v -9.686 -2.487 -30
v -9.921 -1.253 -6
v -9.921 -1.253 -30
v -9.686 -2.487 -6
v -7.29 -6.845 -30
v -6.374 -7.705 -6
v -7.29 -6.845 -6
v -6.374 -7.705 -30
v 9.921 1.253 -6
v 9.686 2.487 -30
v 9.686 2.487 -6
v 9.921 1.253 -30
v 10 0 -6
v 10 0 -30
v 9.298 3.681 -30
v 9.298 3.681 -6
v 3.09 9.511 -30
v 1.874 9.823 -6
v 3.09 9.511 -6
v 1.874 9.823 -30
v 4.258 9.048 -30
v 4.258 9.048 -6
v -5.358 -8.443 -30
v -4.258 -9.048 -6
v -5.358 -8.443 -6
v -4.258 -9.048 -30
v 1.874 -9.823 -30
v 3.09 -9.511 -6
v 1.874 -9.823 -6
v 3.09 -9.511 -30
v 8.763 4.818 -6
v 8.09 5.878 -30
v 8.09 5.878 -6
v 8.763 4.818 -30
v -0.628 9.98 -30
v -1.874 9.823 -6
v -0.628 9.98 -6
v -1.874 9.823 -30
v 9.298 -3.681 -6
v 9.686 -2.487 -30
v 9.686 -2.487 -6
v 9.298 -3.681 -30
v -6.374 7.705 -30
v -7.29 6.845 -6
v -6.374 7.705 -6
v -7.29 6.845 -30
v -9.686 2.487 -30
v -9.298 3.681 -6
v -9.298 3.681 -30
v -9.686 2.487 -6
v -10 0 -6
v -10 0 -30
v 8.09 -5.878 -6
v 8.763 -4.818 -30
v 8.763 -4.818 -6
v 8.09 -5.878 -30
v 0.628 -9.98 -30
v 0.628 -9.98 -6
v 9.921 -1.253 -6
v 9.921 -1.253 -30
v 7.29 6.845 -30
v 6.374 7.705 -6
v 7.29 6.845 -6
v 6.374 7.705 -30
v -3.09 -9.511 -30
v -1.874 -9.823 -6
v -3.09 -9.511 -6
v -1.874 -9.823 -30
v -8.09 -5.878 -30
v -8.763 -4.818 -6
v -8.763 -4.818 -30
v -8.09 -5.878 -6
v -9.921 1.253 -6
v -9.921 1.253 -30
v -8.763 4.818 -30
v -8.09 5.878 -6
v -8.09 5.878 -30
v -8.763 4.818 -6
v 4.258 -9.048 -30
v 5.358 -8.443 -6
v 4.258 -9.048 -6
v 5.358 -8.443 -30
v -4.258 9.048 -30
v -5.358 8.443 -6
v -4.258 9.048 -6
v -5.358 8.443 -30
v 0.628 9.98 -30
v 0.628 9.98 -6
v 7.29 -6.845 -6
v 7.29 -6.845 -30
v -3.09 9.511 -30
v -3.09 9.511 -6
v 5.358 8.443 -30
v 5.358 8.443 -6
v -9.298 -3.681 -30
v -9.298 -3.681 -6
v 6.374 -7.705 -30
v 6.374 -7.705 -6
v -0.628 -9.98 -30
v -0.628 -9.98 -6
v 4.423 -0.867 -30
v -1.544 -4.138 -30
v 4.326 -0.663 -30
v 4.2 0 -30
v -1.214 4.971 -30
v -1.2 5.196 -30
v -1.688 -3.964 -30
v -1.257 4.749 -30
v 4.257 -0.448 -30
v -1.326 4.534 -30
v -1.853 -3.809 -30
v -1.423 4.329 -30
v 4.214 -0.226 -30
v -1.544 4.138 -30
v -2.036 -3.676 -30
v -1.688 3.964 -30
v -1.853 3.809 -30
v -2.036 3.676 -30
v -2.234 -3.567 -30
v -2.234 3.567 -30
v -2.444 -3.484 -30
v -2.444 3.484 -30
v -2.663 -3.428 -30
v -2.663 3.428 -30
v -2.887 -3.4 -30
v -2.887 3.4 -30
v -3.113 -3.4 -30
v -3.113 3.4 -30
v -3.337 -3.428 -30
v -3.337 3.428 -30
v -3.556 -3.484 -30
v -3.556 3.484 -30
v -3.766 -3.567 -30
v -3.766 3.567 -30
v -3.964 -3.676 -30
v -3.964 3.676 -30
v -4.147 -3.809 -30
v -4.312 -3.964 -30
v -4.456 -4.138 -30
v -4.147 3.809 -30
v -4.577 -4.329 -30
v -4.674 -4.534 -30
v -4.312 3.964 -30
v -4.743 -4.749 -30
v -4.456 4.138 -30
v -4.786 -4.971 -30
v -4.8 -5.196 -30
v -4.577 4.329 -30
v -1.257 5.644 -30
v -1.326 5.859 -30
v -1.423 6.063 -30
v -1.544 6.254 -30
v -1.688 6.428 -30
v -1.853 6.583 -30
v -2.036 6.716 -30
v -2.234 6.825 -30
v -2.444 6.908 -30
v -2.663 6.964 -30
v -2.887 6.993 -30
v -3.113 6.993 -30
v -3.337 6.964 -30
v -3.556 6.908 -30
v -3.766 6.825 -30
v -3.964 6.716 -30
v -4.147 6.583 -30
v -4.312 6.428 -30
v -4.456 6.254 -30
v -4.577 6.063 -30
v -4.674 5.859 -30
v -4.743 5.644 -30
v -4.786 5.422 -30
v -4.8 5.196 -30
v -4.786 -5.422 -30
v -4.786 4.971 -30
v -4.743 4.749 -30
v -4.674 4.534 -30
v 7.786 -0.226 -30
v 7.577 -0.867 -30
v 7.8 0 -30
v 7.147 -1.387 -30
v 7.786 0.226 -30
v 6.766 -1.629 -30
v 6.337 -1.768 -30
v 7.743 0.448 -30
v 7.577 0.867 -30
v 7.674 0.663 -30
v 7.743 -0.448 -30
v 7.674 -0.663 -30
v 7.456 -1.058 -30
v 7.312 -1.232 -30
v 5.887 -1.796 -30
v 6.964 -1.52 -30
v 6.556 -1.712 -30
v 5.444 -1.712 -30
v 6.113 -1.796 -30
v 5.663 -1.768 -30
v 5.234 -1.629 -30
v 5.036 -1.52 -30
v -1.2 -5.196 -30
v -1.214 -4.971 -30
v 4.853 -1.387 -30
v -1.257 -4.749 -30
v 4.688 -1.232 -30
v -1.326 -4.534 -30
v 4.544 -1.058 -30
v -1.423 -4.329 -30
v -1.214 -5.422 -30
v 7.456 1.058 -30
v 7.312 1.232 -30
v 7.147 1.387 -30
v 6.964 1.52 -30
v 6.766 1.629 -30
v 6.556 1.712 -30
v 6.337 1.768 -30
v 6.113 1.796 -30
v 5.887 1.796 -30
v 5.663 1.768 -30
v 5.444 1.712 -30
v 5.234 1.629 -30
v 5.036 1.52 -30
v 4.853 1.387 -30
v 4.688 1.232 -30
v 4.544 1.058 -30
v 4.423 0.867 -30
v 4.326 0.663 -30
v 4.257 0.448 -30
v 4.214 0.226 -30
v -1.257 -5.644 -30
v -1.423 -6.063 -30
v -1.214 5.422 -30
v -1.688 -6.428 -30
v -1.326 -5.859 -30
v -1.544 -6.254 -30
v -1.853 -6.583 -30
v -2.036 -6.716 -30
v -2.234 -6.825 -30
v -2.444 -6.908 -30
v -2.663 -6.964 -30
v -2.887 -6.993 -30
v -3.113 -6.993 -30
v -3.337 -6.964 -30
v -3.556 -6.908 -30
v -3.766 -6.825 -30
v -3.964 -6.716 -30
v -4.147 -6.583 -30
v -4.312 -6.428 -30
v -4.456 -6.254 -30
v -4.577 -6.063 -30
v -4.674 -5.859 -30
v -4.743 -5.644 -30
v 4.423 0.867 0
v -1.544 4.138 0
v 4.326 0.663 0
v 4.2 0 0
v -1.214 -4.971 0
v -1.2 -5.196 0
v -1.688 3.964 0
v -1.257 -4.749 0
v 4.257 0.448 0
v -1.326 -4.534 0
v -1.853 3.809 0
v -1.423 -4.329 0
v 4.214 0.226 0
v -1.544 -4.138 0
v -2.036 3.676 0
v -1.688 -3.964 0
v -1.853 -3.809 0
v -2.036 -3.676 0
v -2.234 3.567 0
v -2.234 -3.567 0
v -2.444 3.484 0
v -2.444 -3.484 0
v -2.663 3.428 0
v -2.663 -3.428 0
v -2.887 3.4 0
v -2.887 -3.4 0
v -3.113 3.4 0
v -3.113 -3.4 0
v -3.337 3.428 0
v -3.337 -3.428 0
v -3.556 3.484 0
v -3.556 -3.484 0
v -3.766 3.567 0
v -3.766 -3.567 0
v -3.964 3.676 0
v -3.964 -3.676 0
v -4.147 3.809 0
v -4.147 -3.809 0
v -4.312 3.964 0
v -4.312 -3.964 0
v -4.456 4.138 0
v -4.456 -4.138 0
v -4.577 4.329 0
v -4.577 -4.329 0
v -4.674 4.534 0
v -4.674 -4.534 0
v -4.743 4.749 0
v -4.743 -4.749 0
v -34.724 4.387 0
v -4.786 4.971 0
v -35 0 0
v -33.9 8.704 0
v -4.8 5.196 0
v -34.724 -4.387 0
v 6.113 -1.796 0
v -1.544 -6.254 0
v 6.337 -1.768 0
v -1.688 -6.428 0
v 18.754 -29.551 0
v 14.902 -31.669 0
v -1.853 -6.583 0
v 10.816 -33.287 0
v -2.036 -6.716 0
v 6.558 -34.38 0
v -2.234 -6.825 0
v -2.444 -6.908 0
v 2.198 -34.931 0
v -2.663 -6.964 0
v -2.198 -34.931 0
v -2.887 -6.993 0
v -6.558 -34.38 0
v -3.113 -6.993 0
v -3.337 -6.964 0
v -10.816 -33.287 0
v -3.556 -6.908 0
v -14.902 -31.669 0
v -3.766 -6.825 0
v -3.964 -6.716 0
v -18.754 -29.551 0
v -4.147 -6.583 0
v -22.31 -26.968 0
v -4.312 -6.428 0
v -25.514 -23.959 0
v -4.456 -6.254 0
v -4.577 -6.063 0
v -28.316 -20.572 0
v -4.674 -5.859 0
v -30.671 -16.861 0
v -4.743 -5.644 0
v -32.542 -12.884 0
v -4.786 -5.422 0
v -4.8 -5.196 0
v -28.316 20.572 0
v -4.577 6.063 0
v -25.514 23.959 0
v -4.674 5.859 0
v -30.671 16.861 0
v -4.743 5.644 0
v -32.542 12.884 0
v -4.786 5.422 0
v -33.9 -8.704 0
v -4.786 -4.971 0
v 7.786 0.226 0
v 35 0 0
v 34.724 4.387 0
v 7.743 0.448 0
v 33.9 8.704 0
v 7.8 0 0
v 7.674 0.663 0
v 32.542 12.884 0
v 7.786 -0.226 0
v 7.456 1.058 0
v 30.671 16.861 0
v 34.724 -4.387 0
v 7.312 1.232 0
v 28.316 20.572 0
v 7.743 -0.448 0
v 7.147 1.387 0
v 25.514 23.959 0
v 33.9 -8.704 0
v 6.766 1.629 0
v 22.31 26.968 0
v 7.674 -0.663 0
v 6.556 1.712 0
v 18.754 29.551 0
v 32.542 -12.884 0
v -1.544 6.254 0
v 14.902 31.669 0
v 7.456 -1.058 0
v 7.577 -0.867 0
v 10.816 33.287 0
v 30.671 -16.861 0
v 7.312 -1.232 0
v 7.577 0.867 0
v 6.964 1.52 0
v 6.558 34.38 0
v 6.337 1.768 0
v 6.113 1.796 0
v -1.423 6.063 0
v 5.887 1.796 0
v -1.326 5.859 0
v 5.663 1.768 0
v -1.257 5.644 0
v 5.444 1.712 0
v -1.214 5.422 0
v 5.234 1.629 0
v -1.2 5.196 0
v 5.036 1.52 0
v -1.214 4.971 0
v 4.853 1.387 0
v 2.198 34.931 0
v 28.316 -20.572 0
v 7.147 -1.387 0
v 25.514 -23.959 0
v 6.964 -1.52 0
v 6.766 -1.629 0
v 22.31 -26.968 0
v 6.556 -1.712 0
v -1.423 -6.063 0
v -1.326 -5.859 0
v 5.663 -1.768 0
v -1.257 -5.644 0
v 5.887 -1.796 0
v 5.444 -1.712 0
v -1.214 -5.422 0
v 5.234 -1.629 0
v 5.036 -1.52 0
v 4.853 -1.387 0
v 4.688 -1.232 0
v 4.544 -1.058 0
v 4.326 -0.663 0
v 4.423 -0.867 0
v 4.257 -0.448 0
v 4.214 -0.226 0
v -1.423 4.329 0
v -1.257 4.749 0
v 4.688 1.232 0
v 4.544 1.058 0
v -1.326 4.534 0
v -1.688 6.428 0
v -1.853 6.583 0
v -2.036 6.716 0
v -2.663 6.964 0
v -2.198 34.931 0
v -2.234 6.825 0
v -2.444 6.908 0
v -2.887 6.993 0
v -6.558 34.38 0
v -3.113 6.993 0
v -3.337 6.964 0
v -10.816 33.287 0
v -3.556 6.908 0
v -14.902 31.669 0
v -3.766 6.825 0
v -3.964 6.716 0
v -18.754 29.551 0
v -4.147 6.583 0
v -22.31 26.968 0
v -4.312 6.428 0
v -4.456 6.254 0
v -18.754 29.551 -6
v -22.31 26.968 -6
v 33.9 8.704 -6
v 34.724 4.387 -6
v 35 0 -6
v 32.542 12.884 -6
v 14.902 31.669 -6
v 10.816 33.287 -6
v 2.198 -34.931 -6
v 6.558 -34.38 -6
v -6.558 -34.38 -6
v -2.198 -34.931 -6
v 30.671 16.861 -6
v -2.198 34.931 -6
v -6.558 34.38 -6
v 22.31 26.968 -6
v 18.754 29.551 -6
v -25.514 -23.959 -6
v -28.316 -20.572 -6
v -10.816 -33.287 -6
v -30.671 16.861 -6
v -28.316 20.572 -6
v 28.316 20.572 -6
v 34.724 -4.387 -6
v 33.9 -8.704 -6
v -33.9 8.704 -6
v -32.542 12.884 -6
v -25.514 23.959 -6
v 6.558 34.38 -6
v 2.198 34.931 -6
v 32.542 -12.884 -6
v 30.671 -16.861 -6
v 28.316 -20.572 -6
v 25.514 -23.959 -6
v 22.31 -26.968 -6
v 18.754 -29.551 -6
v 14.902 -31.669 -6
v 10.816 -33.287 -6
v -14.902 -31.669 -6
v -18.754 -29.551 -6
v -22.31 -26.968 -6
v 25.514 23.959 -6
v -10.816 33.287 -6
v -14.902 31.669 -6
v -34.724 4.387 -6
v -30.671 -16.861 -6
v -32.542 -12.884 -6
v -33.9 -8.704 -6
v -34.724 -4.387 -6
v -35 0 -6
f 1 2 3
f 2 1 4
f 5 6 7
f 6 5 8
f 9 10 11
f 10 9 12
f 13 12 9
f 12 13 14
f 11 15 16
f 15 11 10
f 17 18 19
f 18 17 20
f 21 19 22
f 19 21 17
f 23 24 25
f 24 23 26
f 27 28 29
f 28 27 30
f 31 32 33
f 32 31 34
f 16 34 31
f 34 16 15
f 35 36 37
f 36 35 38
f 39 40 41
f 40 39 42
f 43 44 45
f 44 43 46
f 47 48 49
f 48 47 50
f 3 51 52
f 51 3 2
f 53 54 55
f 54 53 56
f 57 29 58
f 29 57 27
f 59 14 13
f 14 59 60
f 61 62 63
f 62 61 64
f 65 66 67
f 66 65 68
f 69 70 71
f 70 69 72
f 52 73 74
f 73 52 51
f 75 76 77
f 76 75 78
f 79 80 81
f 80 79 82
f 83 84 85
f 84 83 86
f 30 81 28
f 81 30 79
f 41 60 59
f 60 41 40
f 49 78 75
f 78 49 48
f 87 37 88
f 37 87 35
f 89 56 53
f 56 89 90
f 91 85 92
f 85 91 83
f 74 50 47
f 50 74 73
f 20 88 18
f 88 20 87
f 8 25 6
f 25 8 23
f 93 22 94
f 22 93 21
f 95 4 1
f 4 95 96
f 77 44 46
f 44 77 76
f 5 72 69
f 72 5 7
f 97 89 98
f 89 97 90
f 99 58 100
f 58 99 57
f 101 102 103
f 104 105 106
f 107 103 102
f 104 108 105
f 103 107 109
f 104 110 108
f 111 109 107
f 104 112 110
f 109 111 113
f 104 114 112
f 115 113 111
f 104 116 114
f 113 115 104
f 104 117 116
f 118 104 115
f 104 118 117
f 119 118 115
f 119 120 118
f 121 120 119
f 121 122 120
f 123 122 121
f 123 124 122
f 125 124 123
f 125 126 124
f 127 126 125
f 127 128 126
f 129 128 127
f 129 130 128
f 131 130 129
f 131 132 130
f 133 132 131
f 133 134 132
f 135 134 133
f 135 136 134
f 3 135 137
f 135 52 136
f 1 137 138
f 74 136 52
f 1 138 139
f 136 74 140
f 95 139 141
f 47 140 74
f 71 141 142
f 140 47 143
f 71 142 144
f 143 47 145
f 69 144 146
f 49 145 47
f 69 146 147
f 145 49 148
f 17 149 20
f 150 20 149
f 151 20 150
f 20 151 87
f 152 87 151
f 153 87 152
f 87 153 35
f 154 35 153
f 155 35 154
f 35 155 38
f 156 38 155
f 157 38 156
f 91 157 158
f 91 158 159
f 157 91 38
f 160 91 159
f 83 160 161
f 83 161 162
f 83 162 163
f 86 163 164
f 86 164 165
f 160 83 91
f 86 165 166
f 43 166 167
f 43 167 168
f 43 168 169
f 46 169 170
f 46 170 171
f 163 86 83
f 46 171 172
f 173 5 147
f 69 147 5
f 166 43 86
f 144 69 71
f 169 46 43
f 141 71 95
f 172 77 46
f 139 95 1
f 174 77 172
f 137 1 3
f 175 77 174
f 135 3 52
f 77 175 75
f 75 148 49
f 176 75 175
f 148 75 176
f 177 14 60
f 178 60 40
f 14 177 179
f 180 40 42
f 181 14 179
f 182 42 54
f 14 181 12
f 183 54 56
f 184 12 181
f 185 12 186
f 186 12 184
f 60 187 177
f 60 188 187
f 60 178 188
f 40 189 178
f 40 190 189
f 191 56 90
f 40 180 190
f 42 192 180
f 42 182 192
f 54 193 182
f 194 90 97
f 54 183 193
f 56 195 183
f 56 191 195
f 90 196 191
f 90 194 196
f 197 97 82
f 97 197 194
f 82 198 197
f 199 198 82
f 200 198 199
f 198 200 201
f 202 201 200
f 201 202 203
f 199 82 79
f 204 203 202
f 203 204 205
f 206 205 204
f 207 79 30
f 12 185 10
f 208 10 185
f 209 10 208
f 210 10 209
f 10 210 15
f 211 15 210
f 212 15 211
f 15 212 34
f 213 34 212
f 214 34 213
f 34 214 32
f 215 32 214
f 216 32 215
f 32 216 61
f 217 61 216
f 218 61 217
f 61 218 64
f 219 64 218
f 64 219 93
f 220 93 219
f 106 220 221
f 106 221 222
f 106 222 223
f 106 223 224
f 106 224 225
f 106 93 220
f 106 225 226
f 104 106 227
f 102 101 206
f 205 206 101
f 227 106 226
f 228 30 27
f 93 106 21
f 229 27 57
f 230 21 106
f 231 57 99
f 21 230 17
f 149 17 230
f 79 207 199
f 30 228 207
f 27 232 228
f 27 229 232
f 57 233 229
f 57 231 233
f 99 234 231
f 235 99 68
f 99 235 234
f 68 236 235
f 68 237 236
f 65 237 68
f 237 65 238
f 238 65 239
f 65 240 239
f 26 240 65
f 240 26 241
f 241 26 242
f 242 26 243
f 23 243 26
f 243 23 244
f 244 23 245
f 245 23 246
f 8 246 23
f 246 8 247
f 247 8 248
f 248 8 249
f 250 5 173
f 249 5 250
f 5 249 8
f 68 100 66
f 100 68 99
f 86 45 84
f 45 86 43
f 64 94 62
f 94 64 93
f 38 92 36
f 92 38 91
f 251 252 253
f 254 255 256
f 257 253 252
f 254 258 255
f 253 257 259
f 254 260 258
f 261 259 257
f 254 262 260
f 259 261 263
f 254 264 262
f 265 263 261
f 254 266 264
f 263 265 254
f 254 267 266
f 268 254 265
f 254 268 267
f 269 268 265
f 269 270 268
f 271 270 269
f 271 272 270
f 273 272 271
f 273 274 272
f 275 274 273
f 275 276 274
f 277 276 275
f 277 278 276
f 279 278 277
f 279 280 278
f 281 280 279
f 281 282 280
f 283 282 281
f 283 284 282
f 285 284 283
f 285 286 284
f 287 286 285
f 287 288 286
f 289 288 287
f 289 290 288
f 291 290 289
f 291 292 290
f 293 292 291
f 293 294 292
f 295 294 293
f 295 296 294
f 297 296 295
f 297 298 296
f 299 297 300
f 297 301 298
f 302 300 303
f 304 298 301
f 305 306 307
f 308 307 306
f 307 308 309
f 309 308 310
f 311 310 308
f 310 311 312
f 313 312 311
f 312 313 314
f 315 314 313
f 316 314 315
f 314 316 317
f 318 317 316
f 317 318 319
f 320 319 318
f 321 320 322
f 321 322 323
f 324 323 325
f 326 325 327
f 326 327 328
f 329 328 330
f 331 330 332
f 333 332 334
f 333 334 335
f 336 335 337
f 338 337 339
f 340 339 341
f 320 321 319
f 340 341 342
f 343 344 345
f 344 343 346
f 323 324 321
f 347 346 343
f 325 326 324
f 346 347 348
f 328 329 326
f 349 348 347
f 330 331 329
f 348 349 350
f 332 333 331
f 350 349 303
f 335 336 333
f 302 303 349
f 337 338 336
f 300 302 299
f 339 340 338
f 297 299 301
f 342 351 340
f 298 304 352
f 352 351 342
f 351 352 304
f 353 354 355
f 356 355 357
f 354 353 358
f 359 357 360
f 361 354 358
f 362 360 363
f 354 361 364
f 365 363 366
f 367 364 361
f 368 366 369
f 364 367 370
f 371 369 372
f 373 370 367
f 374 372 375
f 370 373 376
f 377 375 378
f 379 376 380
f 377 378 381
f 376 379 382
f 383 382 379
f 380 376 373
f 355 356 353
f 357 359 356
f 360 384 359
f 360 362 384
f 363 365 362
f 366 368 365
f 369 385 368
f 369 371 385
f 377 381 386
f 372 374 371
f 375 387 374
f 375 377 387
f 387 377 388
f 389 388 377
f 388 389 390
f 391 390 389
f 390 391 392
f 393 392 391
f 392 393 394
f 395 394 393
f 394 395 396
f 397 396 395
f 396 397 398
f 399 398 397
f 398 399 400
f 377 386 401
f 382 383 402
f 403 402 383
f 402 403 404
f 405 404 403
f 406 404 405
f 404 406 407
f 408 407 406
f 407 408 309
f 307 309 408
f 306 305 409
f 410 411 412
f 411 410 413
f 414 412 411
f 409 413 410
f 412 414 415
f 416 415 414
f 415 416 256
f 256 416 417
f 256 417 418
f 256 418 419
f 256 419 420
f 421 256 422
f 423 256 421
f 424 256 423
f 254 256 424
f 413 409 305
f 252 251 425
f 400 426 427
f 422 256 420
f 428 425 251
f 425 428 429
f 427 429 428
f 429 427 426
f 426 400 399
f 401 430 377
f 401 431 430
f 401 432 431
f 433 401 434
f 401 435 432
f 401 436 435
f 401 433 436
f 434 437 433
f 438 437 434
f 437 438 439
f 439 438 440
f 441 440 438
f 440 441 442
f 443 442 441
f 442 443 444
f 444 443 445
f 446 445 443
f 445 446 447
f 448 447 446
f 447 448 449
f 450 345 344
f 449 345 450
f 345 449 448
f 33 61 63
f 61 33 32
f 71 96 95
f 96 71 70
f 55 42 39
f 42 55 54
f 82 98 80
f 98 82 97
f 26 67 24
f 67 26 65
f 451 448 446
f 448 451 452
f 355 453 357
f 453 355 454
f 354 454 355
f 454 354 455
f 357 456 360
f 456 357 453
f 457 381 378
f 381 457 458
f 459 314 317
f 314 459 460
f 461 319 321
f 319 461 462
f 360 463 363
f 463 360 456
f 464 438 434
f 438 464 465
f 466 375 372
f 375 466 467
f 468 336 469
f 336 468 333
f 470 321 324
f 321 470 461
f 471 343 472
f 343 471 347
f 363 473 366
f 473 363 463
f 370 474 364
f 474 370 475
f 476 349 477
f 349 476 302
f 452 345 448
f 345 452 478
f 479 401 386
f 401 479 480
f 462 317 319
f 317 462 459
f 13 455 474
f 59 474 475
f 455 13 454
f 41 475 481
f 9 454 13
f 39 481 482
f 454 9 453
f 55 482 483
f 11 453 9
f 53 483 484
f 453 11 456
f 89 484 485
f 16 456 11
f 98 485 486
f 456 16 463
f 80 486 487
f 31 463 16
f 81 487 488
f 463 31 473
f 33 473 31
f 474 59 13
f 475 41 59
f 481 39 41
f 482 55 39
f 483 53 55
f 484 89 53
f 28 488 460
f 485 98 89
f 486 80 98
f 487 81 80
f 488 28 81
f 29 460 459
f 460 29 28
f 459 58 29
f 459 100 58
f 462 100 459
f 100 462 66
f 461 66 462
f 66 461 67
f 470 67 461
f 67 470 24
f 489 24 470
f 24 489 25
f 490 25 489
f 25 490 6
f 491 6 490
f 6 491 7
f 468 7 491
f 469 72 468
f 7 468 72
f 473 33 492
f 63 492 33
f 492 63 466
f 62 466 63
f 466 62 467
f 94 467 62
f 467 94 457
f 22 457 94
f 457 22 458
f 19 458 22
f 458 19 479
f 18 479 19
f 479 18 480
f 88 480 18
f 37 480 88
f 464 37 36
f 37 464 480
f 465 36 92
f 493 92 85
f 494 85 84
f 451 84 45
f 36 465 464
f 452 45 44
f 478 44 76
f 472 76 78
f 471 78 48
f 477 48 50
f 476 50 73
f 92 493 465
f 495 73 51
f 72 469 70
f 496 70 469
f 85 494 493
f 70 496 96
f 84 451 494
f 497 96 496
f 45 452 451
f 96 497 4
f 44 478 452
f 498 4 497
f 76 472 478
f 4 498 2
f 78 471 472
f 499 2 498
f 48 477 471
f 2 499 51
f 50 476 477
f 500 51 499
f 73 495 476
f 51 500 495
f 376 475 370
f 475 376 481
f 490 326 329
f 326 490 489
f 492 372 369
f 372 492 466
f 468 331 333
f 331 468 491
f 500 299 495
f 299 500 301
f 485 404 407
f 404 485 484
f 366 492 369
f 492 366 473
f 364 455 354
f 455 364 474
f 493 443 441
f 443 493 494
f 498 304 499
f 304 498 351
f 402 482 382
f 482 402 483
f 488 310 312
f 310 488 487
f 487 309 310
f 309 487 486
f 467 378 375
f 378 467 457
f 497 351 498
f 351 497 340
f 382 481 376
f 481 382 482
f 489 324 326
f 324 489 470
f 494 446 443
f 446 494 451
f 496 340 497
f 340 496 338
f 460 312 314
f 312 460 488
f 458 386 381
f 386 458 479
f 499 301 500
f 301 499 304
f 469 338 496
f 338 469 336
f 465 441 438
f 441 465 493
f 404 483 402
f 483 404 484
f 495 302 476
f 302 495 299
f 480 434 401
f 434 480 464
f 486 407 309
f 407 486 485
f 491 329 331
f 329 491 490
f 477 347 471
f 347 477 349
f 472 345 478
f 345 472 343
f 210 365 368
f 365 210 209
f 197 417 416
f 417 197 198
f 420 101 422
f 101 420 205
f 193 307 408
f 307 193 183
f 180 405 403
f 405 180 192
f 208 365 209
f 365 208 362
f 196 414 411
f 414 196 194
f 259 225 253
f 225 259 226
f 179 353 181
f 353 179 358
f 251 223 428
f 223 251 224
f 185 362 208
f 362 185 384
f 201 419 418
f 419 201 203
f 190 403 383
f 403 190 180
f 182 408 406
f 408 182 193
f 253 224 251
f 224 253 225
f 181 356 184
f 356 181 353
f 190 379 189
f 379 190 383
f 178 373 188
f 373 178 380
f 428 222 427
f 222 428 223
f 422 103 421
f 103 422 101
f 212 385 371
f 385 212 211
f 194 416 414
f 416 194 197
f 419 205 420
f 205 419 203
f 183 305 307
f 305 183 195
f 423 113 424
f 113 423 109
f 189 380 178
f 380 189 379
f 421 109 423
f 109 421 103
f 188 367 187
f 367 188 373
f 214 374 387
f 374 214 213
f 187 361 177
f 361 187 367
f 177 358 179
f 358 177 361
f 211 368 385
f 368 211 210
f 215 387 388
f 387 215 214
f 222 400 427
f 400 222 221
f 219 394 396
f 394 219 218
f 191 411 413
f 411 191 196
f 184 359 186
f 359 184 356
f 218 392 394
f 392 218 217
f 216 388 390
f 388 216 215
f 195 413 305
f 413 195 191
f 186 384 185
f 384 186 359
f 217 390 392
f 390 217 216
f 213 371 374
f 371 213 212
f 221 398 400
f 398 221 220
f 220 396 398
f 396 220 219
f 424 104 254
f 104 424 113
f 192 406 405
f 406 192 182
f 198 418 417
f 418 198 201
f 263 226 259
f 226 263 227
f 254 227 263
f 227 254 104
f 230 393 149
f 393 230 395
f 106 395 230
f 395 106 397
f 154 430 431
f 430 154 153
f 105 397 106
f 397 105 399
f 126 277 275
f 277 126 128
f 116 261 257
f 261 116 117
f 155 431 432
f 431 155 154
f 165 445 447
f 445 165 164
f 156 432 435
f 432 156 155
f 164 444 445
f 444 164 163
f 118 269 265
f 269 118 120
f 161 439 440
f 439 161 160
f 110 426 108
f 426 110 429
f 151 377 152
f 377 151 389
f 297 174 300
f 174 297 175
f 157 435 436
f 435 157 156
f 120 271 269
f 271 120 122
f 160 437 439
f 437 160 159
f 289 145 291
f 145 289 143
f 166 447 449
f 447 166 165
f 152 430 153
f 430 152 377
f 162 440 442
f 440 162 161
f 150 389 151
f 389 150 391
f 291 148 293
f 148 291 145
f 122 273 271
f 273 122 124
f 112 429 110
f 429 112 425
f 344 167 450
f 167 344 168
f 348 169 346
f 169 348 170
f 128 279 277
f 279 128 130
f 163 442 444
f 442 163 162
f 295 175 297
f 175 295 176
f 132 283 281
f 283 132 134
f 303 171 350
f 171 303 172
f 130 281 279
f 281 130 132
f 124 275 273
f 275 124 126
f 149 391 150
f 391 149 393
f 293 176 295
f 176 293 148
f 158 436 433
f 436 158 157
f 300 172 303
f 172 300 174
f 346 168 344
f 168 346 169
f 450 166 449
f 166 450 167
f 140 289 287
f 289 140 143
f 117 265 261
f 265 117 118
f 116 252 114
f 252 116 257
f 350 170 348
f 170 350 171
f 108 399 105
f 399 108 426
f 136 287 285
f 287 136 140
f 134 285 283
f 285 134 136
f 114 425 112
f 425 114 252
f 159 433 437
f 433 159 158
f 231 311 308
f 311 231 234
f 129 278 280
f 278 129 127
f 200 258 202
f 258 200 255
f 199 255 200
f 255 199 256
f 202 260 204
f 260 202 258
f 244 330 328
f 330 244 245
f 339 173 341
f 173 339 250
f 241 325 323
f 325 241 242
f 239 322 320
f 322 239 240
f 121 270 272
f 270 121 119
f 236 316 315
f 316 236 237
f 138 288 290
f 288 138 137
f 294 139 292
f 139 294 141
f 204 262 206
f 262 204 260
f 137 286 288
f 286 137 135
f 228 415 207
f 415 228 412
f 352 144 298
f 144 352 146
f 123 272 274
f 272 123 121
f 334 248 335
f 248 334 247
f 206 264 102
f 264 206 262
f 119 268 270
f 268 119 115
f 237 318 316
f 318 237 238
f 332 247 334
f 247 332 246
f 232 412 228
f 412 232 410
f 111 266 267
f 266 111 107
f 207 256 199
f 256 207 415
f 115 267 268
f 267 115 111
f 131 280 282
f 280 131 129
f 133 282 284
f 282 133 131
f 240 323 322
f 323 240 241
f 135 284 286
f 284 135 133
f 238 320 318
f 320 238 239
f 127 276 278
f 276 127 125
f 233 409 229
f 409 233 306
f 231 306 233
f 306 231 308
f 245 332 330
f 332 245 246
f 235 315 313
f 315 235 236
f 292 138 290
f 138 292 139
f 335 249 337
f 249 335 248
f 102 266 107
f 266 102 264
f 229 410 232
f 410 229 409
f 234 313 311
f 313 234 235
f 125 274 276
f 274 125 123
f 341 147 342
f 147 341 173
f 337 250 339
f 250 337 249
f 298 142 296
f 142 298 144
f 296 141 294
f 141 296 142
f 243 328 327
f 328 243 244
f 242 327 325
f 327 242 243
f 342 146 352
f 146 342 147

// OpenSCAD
$fn = 50;


difference() {
	union() {
		translate(v = [0, 0, -30.0000000000]) {
			cylinder(h = 30, r = 10.0000000000);
		}
		translate(v = [0, 0, -6.0000000000]) {
			cylinder(h = 6, r = 35.0000000000);
		}
	}
	union() {
		#translate(v = [6.0000000000, 0.0000000000, -30]) {
			cylinder(h = 30, r = 1.8000000000);
		}
		#translate(v = [-3.0000000000, 5.1961524227, -30]) {
			cylinder(h = 30, r = 1.8000000000);
		}
		#translate(v = [-3.0000000000, -5.1961524227, -30]) {
			cylinder(h = 30, r = 1.8000000000);
		}
	}
}
